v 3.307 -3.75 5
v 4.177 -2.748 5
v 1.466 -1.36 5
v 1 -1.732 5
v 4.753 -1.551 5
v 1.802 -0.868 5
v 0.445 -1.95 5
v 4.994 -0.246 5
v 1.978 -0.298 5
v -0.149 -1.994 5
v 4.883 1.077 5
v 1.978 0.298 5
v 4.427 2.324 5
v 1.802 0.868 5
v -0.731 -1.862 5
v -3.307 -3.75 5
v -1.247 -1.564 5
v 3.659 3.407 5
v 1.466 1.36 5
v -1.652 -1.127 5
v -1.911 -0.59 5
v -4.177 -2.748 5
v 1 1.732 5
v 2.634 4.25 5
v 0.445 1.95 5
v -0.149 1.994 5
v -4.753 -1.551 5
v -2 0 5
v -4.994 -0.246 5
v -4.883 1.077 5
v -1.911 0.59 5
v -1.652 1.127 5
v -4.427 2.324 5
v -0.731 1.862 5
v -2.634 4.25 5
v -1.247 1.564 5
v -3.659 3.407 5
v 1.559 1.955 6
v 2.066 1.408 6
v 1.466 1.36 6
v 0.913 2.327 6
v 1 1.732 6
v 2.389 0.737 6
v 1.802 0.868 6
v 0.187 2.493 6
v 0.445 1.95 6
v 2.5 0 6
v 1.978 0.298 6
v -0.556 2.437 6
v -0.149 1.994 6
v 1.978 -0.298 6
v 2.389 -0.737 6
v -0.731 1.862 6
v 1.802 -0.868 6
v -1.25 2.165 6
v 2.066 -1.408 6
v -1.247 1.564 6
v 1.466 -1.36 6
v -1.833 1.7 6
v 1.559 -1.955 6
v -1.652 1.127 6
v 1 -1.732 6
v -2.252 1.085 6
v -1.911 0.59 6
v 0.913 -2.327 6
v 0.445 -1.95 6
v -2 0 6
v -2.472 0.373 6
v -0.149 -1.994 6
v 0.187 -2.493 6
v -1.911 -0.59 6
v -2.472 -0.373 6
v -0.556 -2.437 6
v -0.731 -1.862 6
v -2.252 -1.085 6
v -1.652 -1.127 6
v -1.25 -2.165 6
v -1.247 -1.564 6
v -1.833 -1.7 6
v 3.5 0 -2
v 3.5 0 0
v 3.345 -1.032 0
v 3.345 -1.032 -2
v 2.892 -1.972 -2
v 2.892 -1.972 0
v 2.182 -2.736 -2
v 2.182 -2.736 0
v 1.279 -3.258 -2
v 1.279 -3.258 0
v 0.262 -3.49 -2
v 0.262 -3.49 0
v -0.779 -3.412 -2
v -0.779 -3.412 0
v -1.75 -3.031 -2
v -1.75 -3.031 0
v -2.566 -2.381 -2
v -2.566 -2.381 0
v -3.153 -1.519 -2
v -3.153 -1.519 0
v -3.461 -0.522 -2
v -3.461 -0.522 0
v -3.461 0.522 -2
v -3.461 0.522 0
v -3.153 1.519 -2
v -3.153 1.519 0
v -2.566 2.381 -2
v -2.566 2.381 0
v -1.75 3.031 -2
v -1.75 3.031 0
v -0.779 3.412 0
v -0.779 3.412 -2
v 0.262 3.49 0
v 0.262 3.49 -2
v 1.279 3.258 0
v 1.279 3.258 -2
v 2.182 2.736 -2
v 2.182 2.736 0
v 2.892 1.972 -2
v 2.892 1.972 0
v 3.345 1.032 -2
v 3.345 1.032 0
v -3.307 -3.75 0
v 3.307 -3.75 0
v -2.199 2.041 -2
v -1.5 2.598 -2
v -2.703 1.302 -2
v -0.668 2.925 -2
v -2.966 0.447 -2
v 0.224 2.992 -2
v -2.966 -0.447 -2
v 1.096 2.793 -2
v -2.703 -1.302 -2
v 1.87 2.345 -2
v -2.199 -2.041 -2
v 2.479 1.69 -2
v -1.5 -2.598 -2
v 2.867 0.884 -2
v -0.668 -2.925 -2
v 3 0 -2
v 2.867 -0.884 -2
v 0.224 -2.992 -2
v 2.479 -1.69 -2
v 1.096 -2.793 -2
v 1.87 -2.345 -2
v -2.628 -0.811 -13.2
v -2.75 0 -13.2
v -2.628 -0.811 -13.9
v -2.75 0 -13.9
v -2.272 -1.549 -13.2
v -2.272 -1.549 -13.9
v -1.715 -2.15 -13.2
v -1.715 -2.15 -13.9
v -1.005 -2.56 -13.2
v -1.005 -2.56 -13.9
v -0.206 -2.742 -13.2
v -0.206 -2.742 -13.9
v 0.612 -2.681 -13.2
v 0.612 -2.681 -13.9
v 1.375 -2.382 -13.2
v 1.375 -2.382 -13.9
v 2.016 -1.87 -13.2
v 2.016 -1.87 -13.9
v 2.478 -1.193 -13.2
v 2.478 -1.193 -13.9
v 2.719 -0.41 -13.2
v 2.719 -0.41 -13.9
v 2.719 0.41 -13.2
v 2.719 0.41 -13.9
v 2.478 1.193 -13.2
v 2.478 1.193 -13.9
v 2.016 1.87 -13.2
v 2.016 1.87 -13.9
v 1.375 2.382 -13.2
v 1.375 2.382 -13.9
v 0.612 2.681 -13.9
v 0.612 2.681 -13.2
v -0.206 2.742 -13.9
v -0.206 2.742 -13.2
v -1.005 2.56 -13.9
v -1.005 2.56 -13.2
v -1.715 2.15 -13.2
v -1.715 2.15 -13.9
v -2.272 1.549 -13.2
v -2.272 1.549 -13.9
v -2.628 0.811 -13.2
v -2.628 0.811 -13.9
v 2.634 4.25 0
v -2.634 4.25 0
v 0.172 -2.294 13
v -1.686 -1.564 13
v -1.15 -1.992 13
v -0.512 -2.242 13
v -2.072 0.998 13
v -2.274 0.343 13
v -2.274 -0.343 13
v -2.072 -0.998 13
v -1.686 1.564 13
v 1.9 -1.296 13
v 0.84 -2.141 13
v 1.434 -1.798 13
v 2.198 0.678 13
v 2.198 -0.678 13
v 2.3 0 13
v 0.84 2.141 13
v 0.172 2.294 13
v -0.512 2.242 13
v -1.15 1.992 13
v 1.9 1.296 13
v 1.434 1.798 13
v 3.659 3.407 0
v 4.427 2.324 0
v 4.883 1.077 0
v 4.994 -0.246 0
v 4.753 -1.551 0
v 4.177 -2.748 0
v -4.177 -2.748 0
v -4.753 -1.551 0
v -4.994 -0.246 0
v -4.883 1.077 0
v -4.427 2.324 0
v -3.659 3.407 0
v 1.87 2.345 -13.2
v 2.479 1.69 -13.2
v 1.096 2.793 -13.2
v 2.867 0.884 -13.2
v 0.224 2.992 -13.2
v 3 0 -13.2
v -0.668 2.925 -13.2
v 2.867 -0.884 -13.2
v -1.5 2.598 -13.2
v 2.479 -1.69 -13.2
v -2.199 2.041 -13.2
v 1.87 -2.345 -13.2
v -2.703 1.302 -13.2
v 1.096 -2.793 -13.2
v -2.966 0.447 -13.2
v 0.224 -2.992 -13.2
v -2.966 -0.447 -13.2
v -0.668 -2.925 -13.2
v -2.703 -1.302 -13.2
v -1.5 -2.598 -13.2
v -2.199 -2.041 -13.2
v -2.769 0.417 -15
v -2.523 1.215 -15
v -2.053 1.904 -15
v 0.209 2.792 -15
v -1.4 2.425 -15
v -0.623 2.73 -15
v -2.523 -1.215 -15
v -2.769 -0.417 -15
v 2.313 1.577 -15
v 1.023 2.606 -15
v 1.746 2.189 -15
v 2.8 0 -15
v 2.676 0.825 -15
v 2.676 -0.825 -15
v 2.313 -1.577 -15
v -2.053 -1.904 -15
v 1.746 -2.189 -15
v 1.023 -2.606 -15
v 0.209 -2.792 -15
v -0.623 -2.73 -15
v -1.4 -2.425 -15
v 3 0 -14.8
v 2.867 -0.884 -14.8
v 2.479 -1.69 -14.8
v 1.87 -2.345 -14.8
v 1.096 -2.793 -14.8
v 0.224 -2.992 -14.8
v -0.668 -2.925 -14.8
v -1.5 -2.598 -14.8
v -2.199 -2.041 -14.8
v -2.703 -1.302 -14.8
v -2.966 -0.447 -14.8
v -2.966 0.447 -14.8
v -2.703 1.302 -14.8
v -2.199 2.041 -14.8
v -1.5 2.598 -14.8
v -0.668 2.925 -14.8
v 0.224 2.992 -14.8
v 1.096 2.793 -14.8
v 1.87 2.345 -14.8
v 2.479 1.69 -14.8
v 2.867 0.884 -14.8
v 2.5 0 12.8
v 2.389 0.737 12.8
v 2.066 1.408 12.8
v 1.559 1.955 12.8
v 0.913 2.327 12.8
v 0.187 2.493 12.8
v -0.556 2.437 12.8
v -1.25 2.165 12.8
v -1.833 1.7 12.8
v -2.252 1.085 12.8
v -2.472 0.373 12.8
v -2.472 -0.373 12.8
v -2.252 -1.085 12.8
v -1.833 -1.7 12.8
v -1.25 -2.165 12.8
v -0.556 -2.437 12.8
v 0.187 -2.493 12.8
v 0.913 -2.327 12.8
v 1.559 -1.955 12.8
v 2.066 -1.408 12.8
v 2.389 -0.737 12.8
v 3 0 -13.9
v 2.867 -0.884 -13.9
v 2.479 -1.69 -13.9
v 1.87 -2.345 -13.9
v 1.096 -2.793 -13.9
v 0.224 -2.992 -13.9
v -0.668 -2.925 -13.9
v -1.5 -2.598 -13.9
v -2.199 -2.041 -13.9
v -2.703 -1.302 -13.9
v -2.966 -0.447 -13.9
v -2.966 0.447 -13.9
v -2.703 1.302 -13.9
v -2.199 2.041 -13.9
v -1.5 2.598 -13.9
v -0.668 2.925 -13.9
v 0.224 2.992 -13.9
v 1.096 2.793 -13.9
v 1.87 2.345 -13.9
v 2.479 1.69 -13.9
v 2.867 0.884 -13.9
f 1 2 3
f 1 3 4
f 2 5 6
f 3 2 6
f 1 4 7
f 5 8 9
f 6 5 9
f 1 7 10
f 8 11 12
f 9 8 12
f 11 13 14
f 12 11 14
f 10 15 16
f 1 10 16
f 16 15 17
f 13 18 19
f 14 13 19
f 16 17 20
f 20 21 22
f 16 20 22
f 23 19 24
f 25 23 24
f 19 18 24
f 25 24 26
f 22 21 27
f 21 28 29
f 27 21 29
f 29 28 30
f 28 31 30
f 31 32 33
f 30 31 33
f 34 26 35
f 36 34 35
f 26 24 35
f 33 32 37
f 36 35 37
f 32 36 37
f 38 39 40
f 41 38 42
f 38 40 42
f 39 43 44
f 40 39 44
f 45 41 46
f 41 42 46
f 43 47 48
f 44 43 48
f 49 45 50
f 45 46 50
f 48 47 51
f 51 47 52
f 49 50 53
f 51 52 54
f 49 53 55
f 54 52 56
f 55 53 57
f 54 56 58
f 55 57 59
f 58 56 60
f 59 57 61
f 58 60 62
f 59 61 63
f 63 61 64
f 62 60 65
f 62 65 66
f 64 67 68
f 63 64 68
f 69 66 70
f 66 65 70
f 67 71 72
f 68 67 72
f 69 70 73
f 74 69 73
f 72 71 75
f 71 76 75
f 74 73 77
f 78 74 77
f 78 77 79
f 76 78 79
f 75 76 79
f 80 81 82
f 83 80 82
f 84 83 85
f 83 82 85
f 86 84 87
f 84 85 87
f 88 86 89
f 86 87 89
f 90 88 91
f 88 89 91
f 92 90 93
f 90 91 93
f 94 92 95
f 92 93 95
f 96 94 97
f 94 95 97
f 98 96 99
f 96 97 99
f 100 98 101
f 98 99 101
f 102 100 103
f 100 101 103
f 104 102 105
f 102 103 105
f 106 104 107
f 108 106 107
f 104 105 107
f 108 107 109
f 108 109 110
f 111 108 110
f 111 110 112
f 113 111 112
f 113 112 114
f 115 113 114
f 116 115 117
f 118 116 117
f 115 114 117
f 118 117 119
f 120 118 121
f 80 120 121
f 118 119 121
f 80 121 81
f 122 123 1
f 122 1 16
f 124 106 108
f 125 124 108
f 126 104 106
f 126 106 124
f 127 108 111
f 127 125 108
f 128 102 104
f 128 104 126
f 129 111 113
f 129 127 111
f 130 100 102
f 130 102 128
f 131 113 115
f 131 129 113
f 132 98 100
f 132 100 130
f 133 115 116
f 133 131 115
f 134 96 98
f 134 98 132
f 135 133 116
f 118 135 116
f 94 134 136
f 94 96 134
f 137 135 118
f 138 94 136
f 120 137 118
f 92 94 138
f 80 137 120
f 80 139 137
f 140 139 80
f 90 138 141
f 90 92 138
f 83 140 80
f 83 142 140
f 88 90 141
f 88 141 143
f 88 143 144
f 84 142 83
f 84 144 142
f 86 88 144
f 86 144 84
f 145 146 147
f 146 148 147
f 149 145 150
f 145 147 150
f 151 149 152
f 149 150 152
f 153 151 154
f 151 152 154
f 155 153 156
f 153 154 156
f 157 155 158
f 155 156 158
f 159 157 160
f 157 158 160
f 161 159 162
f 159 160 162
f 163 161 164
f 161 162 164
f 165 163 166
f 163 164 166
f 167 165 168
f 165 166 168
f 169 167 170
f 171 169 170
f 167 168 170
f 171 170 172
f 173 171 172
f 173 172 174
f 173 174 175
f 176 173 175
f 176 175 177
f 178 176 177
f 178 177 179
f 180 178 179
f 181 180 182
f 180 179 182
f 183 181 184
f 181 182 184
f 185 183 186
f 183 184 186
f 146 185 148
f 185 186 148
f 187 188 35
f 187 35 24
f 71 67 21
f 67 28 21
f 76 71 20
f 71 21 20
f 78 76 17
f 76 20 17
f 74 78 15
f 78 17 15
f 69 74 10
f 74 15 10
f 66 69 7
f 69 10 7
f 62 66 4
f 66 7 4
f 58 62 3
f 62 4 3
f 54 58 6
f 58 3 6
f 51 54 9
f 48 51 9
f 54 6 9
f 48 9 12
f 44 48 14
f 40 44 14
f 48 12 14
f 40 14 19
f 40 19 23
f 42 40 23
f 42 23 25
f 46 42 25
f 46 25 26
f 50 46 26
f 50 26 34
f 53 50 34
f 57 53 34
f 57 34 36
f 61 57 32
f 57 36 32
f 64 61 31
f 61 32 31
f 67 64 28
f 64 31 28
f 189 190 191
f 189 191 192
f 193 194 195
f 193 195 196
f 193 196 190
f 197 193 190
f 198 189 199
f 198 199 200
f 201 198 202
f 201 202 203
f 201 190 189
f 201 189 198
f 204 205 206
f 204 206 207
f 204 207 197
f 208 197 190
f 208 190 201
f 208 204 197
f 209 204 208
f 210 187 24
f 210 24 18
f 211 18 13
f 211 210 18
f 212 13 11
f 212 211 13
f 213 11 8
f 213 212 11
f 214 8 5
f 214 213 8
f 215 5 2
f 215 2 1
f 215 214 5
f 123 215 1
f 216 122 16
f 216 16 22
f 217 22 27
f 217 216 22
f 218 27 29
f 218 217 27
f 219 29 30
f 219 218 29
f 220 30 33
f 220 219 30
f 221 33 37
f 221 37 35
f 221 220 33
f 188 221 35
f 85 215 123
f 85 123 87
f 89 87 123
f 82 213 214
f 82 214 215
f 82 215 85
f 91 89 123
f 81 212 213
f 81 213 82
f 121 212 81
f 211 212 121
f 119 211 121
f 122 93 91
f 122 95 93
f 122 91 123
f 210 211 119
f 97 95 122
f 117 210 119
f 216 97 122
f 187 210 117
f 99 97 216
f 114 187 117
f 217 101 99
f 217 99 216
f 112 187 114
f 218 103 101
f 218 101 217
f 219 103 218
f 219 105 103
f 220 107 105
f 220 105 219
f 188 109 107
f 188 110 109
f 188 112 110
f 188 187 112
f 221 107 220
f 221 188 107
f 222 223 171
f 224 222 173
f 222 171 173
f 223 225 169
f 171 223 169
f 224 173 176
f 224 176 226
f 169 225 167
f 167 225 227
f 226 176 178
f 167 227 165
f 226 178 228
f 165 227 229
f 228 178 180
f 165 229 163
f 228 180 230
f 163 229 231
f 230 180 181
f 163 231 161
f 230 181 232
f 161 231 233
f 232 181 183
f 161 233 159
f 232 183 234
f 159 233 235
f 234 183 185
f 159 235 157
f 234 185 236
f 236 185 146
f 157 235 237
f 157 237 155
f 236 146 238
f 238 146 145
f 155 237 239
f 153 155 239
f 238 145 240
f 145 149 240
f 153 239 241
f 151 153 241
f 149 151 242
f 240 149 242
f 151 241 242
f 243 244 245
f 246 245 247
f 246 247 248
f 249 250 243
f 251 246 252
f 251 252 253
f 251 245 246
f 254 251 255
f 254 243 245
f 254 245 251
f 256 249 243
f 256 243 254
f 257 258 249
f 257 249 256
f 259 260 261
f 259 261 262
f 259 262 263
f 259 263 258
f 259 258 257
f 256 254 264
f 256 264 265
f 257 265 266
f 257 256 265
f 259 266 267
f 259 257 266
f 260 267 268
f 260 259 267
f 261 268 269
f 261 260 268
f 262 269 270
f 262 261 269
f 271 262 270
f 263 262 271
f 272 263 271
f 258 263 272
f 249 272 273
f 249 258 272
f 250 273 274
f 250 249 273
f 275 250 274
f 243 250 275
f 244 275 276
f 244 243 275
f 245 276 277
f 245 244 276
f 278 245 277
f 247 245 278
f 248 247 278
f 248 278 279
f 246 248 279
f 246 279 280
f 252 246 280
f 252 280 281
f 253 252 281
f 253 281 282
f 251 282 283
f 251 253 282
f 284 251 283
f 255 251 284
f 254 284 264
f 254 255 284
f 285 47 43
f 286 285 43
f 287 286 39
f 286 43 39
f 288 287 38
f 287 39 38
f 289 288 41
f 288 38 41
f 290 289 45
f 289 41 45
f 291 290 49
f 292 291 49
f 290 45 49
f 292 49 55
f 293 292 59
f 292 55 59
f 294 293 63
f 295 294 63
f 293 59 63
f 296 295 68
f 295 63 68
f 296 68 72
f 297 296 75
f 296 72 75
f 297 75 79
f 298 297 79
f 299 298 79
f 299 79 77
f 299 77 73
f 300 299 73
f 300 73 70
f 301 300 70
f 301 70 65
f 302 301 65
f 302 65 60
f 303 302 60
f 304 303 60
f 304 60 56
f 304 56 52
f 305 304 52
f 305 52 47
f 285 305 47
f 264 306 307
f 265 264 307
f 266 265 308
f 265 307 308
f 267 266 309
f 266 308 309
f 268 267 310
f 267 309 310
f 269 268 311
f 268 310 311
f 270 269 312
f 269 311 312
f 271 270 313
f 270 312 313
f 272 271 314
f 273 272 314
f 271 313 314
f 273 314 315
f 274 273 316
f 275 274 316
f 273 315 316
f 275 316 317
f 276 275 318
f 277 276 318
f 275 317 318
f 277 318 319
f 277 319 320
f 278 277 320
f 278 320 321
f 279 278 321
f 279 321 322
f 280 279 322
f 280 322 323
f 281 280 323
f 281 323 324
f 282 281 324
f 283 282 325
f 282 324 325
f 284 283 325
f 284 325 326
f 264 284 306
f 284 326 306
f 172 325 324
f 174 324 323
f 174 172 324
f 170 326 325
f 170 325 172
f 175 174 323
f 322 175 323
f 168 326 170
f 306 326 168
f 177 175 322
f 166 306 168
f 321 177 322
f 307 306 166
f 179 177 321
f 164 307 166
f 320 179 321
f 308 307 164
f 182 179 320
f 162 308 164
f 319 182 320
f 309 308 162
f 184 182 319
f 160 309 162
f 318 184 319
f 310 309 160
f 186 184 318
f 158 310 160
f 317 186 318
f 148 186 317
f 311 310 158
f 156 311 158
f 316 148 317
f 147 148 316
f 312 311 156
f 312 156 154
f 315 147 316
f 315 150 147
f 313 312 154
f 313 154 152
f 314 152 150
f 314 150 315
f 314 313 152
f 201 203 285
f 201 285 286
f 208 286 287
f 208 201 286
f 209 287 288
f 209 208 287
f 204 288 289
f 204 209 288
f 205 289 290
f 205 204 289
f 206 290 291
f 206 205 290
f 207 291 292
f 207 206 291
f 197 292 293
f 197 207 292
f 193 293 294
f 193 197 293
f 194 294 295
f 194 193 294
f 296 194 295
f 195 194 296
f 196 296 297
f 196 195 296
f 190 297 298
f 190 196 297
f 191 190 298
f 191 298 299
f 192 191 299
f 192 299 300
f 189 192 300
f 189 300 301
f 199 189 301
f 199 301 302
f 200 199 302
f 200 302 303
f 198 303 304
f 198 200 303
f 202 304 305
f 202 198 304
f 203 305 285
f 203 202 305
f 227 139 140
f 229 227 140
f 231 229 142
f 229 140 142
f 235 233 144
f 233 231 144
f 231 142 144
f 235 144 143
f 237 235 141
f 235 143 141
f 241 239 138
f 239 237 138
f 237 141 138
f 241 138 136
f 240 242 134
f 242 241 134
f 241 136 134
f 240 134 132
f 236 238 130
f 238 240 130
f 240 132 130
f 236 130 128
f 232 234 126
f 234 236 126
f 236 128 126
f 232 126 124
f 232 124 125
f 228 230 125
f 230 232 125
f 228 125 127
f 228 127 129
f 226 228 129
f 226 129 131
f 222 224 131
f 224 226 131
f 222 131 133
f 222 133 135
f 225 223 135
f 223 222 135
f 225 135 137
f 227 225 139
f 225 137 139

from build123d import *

# Parameters (mm, degrees)
EXTRUDE_1_DEPTH = 5
SKETCH_2_R      = 2.5
EXTRUDE_2_DEPTH = 8
SKETCH_3_R      = 3
EXTRUDE_3_DEPTH = 15
SKETCH_5_R      = 3.5
EXTRUDE_4_DEPTH = 2
SKETCH_4_W      = 0.25
SKETCH_4_H      = 0.7
SKETCH_4_W_2    = 1.323985747
SKETCH_4_H_2    = 1
CHAMFER_1_SIZE  = 0.2


with BuildPart() as part:
    # 草图1 → 拉伸1 (new body)
    with BuildSketch(Plane.XY):
        with BuildLine():
            Line((-2.633913438, 4.25), (2.633913438, 4.25))
            ThreePointArc((2.633913438, 4.25), (4.982386472, 0.419314968), (3.307189139, -3.75))
            Line((3.307189139, -3.75), (-3.307189139, -3.75))
            ThreePointArc((-3.307189139, -3.75), (-4.982386472, 0.419314968), (-2.633913438, 4.25))
        make_face()
    extrude(amount=EXTRUDE_1_DEPTH)

    # 草图2 → 拉伸2 (add)
    with BuildSketch(Plane.XY.offset(5)):
        Circle(SKETCH_2_R)
    extrude(amount=EXTRUDE_2_DEPTH)

    # 草图3 → 拉伸3 (add)
    with BuildSketch(Plane(origin=(0, 0, 0), x_dir=(-1, 0, 0), z_dir=(0, 0, -1))):
        with Locations(Location((0, 0, 0), (0, 0, 180))):
            Circle(SKETCH_3_R)
    extrude(amount=EXTRUDE_3_DEPTH)

    # 草图5 → 拉伸4 (add)
    with BuildSketch(Plane(origin=(0, 0, 0), x_dir=(-1, 0, 0), z_dir=(0, 0, -1))):
        with Locations(Location((0, 0, 0), (0, 0, 180))):
            Circle(SKETCH_5_R)
    extrude(amount=EXTRUDE_4_DEPTH)

    # 草图4 → 切除-旋转1 (revolve, cut)
    with BuildSketch(Plane(origin=(0, 0, 0), x_dir=(1, 0, 0), z_dir=(0, 1, 0))):
        with Locations((-2.875, 13.55)):
            Rectangle(SKETCH_4_W, SKETCH_4_H)
        with Locations((-2.661992874, -5.5)):
            Rectangle(SKETCH_4_W_2, SKETCH_4_H_2)
    revolve(axis=Axis((0, 0, -15), (0, 0, 1)), mode=Mode.SUBTRACT)

    # 倒角1
    chamfer_1_edges = [part.edges().sort_by_distance(p)[0] for p in [
        (-2.5, 0, 13),
        (-3, 0, -15),
    ]]
    chamfer(chamfer_1_edges, length=CHAMFER_1_SIZE)


solid = part.part
